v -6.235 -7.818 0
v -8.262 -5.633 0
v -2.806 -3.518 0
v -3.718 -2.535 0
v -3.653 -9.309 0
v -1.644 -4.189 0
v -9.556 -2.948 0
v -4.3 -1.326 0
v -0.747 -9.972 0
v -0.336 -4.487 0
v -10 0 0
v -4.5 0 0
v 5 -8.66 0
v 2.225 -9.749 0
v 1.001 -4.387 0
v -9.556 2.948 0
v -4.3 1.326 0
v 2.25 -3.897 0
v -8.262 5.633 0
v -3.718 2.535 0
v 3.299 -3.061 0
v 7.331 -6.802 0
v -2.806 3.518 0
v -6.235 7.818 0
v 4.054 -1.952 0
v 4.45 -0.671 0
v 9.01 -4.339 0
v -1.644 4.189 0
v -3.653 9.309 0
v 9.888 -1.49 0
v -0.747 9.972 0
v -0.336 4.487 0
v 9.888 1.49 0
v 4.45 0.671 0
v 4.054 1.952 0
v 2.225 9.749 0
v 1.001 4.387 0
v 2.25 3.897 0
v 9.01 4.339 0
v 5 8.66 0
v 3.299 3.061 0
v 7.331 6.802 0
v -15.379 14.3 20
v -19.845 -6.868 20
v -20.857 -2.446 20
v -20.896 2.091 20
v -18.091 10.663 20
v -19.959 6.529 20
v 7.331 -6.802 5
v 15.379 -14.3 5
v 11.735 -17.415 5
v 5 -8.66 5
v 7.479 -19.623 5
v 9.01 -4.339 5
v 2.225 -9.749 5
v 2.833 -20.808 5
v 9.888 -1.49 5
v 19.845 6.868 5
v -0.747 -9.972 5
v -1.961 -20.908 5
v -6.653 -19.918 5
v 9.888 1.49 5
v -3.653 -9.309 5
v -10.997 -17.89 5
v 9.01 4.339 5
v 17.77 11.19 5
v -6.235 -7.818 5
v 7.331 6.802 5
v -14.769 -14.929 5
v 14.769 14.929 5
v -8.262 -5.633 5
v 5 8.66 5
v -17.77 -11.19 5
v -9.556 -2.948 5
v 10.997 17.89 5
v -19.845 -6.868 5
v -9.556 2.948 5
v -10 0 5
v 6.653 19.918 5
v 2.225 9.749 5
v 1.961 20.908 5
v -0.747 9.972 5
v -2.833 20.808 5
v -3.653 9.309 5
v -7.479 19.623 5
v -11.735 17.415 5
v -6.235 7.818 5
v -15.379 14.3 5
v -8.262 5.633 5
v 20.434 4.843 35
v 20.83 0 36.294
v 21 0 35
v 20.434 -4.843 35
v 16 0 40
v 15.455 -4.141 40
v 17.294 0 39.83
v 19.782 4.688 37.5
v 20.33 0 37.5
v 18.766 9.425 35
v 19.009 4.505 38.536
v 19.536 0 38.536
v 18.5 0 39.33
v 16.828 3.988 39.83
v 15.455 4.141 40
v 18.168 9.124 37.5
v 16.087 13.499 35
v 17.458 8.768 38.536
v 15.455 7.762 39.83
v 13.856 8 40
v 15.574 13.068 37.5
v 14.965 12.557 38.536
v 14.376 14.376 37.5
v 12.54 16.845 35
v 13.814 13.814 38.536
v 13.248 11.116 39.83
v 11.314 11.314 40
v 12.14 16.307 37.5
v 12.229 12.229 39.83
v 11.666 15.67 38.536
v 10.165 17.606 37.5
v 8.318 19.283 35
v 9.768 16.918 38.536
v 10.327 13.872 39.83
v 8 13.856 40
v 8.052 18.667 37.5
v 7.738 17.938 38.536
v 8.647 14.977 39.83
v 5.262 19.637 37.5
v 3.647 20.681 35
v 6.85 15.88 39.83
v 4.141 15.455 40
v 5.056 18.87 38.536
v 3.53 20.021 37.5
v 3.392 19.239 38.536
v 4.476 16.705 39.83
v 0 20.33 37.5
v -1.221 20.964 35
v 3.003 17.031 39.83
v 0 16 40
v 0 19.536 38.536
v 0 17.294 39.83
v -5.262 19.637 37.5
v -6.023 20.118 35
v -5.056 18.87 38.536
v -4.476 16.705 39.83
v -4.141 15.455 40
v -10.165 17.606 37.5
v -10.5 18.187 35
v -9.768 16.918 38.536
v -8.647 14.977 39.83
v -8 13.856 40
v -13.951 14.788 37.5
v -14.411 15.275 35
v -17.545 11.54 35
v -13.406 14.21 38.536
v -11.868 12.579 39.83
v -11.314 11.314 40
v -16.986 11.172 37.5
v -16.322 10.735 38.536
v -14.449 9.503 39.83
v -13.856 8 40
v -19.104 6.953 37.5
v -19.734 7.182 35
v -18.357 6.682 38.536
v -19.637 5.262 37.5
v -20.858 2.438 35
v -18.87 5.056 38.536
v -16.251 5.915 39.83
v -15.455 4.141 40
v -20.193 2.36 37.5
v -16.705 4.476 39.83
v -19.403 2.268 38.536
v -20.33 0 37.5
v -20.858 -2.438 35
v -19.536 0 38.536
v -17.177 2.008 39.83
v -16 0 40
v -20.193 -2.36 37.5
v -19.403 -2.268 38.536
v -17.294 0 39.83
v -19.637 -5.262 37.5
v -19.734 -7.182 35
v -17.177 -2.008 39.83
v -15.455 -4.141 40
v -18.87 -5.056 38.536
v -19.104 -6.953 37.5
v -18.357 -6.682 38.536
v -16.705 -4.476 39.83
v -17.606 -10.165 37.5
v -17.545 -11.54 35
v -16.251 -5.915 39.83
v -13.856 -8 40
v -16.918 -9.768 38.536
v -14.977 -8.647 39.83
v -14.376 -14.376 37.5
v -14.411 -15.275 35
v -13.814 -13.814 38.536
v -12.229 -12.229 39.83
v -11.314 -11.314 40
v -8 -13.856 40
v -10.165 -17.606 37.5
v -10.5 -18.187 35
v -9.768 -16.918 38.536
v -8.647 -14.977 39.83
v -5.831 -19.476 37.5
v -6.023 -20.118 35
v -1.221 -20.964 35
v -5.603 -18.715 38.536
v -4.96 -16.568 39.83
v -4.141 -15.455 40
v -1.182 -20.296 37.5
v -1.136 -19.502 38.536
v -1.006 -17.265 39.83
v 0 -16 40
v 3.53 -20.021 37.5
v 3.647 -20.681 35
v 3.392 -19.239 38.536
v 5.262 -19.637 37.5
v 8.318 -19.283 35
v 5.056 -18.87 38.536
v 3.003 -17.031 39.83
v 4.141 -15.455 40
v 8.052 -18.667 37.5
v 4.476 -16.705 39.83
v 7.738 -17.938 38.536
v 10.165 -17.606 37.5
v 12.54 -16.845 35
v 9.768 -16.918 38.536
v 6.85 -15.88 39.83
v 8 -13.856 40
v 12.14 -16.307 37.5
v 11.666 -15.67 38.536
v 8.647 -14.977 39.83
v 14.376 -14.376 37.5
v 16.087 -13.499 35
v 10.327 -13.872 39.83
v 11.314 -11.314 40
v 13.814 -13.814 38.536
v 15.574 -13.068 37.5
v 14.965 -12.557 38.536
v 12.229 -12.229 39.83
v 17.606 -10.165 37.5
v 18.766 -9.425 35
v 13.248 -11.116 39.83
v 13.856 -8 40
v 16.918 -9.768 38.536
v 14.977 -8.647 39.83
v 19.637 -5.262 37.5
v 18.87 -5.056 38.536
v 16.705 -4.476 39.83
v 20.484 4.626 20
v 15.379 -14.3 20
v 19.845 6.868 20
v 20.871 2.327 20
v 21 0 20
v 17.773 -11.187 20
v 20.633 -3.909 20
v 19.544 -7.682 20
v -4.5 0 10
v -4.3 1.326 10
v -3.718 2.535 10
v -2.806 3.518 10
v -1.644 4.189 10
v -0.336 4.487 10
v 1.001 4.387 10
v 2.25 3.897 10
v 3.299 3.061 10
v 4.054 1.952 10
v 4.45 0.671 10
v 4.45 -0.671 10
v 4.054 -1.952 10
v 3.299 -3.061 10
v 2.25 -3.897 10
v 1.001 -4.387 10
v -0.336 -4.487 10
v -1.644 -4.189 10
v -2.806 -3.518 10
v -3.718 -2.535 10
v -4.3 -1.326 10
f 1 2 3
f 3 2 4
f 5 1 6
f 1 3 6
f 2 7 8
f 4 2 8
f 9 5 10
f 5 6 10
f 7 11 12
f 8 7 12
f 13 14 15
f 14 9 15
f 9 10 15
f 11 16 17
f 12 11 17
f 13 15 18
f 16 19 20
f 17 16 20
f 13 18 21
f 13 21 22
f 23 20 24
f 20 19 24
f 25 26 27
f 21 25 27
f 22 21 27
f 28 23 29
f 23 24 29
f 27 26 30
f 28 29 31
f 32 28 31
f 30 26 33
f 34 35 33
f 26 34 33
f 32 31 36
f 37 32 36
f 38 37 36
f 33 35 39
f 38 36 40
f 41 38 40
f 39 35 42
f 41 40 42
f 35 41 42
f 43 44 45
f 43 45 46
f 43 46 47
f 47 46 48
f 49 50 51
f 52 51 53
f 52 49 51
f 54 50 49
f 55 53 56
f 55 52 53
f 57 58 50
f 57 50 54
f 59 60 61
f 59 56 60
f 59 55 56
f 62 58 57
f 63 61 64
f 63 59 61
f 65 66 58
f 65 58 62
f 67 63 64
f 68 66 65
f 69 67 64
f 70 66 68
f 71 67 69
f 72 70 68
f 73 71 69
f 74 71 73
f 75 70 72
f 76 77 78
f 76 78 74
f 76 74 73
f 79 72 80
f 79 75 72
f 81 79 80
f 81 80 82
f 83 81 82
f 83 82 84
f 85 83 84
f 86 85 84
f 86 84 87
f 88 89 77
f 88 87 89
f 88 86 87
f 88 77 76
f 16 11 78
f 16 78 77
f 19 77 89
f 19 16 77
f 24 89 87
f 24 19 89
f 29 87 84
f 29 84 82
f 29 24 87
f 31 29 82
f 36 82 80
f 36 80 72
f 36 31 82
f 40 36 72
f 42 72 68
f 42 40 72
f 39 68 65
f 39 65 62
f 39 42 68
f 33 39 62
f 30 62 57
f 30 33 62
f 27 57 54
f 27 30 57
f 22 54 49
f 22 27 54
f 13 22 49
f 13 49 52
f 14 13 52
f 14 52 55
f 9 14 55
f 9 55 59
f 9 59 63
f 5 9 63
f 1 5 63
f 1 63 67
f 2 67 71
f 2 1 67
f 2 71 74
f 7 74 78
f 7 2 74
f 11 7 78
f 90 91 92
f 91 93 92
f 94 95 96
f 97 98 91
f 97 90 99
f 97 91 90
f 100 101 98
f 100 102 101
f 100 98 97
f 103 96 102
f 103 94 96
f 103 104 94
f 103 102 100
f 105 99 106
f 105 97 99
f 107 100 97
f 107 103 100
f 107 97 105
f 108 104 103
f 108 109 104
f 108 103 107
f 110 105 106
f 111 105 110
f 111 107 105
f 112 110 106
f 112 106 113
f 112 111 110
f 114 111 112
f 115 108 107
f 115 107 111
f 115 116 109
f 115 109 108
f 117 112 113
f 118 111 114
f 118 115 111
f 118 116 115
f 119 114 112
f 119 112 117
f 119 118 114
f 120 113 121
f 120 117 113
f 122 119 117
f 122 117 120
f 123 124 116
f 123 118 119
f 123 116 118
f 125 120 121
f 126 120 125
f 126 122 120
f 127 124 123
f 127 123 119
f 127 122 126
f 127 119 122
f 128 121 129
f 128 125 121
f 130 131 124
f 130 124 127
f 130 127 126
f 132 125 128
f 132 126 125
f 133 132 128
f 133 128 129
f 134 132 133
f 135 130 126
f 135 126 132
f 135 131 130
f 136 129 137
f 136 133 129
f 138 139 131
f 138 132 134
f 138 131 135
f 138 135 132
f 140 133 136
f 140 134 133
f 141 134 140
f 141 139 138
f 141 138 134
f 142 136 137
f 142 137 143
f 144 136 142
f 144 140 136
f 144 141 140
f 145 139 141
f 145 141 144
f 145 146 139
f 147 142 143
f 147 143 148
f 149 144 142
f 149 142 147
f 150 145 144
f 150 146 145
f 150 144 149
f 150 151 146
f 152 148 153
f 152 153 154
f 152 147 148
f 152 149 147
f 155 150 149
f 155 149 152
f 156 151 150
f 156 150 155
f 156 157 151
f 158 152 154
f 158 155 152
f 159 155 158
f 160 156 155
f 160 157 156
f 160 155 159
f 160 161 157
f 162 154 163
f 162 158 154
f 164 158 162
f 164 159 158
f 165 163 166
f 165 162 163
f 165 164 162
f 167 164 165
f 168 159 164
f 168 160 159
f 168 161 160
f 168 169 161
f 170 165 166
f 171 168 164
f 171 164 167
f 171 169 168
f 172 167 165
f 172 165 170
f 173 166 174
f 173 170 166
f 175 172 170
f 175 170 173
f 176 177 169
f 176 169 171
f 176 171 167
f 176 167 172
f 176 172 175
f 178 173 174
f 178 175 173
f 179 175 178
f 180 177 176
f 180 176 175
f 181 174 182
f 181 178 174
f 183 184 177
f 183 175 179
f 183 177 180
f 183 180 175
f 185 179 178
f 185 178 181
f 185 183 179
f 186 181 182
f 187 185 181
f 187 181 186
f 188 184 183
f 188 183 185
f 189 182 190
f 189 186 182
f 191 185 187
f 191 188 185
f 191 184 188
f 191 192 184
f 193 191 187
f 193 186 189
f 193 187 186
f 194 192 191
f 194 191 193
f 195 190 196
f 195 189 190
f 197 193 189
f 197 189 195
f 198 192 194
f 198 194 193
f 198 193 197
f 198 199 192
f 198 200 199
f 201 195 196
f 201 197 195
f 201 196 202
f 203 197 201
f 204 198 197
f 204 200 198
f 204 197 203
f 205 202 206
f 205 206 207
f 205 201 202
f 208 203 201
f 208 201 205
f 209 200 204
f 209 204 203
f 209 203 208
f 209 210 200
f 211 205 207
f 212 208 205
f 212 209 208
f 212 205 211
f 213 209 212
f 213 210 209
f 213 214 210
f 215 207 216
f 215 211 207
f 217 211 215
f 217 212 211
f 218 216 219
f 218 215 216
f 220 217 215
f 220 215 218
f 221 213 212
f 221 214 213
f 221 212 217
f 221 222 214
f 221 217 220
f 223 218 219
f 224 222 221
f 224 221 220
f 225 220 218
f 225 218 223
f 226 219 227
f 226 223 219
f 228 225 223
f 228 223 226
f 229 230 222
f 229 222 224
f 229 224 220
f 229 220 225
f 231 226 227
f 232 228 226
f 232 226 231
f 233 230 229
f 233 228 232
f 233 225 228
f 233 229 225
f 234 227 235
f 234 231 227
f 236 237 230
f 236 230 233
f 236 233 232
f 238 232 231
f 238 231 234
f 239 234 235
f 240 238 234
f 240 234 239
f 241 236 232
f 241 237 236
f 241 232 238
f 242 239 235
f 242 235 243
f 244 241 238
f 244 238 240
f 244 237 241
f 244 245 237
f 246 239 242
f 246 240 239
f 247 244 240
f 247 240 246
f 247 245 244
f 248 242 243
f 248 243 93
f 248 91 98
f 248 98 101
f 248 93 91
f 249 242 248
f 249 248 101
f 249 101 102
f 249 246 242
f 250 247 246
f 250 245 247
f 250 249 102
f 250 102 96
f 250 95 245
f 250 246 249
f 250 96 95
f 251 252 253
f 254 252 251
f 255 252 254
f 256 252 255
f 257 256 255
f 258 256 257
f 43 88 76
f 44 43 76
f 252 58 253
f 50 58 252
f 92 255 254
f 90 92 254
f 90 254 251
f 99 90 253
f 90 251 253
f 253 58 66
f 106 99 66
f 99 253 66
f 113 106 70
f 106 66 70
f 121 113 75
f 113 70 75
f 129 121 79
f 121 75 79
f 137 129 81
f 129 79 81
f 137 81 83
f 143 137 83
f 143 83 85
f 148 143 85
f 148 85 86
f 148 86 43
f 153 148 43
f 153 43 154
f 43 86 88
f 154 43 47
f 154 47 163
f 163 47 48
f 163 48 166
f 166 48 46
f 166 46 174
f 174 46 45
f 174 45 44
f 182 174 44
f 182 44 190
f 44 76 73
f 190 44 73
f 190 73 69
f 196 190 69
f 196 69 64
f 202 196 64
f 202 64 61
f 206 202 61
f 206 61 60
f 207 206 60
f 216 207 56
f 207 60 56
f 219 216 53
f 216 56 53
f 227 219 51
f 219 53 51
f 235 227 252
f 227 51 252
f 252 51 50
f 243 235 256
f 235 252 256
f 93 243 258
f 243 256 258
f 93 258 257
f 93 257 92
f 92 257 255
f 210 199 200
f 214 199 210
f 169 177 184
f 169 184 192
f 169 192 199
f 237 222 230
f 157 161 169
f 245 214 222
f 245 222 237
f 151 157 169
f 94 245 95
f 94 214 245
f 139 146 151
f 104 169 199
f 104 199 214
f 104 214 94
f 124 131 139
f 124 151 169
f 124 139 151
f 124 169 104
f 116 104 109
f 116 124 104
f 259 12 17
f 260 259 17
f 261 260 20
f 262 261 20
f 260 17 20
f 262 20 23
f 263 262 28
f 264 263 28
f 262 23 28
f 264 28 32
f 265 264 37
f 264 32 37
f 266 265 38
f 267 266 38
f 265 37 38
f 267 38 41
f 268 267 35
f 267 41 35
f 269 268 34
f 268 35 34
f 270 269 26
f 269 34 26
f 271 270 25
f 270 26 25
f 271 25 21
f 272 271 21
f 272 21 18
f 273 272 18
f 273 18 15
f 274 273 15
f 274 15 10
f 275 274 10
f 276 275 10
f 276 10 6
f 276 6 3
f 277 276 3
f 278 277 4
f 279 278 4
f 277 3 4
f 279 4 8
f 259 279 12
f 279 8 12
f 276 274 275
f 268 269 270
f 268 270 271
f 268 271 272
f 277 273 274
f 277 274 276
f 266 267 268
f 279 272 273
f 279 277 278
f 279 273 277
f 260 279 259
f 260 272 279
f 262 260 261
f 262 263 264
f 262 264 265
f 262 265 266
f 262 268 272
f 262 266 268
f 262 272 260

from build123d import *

# Parameters (mm, degrees)
SKETCH1_R           = 21
BOSS_EXTRUDE1_DEPTH = 40
SKETCH2_R           = 21
SKETCH2_R_2         = 10
CUT_EXTRUDE1_DEPTH  = 5
CUT_EXTRUDE2_DEPTH  = 15
FILLET1_R           = 5
SKETCH3_R           = 4.5
CUT_EXTRUDE3_DEPTH  = 10


with BuildPart() as part:
    # Sketch1 → Boss-Extrude1 (new body)
    with BuildSketch(Plane.XY):
        Circle(SKETCH1_R)
    extrude(amount=BOSS_EXTRUDE1_DEPTH)

    # Sketch2 → Cut-Extrude1 (cut)
    with BuildSketch(Plane(origin=(0, 0, 0), x_dir=(-1, 0, 0), z_dir=(0, 0, -1))):
        Circle(SKETCH2_R)
        Circle(SKETCH2_R_2, mode=Mode.SUBTRACT)
    extrude(amount=-CUT_EXTRUDE1_DEPTH, mode=Mode.SUBTRACT)

    # Sketch4 → Cut-Extrude2 (cut)
    with BuildSketch(Plane(origin=(0, 0, 5), x_dir=(-1, 0, 0), z_dir=(0, 0, -1))):
        with BuildLine():
            Line((15.379257562, 14.299595688), (19.84526591, -6.867708567))
            ThreePointArc((19.84526591, -6.867708567), (20.547638692, 4.335267488), (15.379257562, 14.299595688))
        make_face()
    cut_extrude2 = extrude(amount=-CUT_EXTRUDE2_DEPTH, mode=Mode.SUBTRACT)

    # Mirror1: Cut-Extrude2 across plane
    add(cut_extrude2.mirror(Plane(origin=(0, 0, 0), x_dir=(0, 0, 1), z_dir=(-0.9784589853258884, 0.20644130893557386, 0))), mode=Mode.SUBTRACT)

    # Fillet1
    fillet1_edges = [part.edges().sort_by_distance(p)[0] for p in [
        (-21, 0, 40),
    ]]
    fillet(fillet1_edges, radius=FILLET1_R)

    # Sketch3 → Cut-Extrude3 (cut)
    with BuildSketch(Plane(origin=(0, 0, 0), x_dir=(-1, 0, 0), z_dir=(0, 0, -1))):
        Circle(SKETCH3_R)
    extrude(amount=-CUT_EXTRUDE3_DEPTH, mode=Mode.SUBTRACT)


solid = part.part
